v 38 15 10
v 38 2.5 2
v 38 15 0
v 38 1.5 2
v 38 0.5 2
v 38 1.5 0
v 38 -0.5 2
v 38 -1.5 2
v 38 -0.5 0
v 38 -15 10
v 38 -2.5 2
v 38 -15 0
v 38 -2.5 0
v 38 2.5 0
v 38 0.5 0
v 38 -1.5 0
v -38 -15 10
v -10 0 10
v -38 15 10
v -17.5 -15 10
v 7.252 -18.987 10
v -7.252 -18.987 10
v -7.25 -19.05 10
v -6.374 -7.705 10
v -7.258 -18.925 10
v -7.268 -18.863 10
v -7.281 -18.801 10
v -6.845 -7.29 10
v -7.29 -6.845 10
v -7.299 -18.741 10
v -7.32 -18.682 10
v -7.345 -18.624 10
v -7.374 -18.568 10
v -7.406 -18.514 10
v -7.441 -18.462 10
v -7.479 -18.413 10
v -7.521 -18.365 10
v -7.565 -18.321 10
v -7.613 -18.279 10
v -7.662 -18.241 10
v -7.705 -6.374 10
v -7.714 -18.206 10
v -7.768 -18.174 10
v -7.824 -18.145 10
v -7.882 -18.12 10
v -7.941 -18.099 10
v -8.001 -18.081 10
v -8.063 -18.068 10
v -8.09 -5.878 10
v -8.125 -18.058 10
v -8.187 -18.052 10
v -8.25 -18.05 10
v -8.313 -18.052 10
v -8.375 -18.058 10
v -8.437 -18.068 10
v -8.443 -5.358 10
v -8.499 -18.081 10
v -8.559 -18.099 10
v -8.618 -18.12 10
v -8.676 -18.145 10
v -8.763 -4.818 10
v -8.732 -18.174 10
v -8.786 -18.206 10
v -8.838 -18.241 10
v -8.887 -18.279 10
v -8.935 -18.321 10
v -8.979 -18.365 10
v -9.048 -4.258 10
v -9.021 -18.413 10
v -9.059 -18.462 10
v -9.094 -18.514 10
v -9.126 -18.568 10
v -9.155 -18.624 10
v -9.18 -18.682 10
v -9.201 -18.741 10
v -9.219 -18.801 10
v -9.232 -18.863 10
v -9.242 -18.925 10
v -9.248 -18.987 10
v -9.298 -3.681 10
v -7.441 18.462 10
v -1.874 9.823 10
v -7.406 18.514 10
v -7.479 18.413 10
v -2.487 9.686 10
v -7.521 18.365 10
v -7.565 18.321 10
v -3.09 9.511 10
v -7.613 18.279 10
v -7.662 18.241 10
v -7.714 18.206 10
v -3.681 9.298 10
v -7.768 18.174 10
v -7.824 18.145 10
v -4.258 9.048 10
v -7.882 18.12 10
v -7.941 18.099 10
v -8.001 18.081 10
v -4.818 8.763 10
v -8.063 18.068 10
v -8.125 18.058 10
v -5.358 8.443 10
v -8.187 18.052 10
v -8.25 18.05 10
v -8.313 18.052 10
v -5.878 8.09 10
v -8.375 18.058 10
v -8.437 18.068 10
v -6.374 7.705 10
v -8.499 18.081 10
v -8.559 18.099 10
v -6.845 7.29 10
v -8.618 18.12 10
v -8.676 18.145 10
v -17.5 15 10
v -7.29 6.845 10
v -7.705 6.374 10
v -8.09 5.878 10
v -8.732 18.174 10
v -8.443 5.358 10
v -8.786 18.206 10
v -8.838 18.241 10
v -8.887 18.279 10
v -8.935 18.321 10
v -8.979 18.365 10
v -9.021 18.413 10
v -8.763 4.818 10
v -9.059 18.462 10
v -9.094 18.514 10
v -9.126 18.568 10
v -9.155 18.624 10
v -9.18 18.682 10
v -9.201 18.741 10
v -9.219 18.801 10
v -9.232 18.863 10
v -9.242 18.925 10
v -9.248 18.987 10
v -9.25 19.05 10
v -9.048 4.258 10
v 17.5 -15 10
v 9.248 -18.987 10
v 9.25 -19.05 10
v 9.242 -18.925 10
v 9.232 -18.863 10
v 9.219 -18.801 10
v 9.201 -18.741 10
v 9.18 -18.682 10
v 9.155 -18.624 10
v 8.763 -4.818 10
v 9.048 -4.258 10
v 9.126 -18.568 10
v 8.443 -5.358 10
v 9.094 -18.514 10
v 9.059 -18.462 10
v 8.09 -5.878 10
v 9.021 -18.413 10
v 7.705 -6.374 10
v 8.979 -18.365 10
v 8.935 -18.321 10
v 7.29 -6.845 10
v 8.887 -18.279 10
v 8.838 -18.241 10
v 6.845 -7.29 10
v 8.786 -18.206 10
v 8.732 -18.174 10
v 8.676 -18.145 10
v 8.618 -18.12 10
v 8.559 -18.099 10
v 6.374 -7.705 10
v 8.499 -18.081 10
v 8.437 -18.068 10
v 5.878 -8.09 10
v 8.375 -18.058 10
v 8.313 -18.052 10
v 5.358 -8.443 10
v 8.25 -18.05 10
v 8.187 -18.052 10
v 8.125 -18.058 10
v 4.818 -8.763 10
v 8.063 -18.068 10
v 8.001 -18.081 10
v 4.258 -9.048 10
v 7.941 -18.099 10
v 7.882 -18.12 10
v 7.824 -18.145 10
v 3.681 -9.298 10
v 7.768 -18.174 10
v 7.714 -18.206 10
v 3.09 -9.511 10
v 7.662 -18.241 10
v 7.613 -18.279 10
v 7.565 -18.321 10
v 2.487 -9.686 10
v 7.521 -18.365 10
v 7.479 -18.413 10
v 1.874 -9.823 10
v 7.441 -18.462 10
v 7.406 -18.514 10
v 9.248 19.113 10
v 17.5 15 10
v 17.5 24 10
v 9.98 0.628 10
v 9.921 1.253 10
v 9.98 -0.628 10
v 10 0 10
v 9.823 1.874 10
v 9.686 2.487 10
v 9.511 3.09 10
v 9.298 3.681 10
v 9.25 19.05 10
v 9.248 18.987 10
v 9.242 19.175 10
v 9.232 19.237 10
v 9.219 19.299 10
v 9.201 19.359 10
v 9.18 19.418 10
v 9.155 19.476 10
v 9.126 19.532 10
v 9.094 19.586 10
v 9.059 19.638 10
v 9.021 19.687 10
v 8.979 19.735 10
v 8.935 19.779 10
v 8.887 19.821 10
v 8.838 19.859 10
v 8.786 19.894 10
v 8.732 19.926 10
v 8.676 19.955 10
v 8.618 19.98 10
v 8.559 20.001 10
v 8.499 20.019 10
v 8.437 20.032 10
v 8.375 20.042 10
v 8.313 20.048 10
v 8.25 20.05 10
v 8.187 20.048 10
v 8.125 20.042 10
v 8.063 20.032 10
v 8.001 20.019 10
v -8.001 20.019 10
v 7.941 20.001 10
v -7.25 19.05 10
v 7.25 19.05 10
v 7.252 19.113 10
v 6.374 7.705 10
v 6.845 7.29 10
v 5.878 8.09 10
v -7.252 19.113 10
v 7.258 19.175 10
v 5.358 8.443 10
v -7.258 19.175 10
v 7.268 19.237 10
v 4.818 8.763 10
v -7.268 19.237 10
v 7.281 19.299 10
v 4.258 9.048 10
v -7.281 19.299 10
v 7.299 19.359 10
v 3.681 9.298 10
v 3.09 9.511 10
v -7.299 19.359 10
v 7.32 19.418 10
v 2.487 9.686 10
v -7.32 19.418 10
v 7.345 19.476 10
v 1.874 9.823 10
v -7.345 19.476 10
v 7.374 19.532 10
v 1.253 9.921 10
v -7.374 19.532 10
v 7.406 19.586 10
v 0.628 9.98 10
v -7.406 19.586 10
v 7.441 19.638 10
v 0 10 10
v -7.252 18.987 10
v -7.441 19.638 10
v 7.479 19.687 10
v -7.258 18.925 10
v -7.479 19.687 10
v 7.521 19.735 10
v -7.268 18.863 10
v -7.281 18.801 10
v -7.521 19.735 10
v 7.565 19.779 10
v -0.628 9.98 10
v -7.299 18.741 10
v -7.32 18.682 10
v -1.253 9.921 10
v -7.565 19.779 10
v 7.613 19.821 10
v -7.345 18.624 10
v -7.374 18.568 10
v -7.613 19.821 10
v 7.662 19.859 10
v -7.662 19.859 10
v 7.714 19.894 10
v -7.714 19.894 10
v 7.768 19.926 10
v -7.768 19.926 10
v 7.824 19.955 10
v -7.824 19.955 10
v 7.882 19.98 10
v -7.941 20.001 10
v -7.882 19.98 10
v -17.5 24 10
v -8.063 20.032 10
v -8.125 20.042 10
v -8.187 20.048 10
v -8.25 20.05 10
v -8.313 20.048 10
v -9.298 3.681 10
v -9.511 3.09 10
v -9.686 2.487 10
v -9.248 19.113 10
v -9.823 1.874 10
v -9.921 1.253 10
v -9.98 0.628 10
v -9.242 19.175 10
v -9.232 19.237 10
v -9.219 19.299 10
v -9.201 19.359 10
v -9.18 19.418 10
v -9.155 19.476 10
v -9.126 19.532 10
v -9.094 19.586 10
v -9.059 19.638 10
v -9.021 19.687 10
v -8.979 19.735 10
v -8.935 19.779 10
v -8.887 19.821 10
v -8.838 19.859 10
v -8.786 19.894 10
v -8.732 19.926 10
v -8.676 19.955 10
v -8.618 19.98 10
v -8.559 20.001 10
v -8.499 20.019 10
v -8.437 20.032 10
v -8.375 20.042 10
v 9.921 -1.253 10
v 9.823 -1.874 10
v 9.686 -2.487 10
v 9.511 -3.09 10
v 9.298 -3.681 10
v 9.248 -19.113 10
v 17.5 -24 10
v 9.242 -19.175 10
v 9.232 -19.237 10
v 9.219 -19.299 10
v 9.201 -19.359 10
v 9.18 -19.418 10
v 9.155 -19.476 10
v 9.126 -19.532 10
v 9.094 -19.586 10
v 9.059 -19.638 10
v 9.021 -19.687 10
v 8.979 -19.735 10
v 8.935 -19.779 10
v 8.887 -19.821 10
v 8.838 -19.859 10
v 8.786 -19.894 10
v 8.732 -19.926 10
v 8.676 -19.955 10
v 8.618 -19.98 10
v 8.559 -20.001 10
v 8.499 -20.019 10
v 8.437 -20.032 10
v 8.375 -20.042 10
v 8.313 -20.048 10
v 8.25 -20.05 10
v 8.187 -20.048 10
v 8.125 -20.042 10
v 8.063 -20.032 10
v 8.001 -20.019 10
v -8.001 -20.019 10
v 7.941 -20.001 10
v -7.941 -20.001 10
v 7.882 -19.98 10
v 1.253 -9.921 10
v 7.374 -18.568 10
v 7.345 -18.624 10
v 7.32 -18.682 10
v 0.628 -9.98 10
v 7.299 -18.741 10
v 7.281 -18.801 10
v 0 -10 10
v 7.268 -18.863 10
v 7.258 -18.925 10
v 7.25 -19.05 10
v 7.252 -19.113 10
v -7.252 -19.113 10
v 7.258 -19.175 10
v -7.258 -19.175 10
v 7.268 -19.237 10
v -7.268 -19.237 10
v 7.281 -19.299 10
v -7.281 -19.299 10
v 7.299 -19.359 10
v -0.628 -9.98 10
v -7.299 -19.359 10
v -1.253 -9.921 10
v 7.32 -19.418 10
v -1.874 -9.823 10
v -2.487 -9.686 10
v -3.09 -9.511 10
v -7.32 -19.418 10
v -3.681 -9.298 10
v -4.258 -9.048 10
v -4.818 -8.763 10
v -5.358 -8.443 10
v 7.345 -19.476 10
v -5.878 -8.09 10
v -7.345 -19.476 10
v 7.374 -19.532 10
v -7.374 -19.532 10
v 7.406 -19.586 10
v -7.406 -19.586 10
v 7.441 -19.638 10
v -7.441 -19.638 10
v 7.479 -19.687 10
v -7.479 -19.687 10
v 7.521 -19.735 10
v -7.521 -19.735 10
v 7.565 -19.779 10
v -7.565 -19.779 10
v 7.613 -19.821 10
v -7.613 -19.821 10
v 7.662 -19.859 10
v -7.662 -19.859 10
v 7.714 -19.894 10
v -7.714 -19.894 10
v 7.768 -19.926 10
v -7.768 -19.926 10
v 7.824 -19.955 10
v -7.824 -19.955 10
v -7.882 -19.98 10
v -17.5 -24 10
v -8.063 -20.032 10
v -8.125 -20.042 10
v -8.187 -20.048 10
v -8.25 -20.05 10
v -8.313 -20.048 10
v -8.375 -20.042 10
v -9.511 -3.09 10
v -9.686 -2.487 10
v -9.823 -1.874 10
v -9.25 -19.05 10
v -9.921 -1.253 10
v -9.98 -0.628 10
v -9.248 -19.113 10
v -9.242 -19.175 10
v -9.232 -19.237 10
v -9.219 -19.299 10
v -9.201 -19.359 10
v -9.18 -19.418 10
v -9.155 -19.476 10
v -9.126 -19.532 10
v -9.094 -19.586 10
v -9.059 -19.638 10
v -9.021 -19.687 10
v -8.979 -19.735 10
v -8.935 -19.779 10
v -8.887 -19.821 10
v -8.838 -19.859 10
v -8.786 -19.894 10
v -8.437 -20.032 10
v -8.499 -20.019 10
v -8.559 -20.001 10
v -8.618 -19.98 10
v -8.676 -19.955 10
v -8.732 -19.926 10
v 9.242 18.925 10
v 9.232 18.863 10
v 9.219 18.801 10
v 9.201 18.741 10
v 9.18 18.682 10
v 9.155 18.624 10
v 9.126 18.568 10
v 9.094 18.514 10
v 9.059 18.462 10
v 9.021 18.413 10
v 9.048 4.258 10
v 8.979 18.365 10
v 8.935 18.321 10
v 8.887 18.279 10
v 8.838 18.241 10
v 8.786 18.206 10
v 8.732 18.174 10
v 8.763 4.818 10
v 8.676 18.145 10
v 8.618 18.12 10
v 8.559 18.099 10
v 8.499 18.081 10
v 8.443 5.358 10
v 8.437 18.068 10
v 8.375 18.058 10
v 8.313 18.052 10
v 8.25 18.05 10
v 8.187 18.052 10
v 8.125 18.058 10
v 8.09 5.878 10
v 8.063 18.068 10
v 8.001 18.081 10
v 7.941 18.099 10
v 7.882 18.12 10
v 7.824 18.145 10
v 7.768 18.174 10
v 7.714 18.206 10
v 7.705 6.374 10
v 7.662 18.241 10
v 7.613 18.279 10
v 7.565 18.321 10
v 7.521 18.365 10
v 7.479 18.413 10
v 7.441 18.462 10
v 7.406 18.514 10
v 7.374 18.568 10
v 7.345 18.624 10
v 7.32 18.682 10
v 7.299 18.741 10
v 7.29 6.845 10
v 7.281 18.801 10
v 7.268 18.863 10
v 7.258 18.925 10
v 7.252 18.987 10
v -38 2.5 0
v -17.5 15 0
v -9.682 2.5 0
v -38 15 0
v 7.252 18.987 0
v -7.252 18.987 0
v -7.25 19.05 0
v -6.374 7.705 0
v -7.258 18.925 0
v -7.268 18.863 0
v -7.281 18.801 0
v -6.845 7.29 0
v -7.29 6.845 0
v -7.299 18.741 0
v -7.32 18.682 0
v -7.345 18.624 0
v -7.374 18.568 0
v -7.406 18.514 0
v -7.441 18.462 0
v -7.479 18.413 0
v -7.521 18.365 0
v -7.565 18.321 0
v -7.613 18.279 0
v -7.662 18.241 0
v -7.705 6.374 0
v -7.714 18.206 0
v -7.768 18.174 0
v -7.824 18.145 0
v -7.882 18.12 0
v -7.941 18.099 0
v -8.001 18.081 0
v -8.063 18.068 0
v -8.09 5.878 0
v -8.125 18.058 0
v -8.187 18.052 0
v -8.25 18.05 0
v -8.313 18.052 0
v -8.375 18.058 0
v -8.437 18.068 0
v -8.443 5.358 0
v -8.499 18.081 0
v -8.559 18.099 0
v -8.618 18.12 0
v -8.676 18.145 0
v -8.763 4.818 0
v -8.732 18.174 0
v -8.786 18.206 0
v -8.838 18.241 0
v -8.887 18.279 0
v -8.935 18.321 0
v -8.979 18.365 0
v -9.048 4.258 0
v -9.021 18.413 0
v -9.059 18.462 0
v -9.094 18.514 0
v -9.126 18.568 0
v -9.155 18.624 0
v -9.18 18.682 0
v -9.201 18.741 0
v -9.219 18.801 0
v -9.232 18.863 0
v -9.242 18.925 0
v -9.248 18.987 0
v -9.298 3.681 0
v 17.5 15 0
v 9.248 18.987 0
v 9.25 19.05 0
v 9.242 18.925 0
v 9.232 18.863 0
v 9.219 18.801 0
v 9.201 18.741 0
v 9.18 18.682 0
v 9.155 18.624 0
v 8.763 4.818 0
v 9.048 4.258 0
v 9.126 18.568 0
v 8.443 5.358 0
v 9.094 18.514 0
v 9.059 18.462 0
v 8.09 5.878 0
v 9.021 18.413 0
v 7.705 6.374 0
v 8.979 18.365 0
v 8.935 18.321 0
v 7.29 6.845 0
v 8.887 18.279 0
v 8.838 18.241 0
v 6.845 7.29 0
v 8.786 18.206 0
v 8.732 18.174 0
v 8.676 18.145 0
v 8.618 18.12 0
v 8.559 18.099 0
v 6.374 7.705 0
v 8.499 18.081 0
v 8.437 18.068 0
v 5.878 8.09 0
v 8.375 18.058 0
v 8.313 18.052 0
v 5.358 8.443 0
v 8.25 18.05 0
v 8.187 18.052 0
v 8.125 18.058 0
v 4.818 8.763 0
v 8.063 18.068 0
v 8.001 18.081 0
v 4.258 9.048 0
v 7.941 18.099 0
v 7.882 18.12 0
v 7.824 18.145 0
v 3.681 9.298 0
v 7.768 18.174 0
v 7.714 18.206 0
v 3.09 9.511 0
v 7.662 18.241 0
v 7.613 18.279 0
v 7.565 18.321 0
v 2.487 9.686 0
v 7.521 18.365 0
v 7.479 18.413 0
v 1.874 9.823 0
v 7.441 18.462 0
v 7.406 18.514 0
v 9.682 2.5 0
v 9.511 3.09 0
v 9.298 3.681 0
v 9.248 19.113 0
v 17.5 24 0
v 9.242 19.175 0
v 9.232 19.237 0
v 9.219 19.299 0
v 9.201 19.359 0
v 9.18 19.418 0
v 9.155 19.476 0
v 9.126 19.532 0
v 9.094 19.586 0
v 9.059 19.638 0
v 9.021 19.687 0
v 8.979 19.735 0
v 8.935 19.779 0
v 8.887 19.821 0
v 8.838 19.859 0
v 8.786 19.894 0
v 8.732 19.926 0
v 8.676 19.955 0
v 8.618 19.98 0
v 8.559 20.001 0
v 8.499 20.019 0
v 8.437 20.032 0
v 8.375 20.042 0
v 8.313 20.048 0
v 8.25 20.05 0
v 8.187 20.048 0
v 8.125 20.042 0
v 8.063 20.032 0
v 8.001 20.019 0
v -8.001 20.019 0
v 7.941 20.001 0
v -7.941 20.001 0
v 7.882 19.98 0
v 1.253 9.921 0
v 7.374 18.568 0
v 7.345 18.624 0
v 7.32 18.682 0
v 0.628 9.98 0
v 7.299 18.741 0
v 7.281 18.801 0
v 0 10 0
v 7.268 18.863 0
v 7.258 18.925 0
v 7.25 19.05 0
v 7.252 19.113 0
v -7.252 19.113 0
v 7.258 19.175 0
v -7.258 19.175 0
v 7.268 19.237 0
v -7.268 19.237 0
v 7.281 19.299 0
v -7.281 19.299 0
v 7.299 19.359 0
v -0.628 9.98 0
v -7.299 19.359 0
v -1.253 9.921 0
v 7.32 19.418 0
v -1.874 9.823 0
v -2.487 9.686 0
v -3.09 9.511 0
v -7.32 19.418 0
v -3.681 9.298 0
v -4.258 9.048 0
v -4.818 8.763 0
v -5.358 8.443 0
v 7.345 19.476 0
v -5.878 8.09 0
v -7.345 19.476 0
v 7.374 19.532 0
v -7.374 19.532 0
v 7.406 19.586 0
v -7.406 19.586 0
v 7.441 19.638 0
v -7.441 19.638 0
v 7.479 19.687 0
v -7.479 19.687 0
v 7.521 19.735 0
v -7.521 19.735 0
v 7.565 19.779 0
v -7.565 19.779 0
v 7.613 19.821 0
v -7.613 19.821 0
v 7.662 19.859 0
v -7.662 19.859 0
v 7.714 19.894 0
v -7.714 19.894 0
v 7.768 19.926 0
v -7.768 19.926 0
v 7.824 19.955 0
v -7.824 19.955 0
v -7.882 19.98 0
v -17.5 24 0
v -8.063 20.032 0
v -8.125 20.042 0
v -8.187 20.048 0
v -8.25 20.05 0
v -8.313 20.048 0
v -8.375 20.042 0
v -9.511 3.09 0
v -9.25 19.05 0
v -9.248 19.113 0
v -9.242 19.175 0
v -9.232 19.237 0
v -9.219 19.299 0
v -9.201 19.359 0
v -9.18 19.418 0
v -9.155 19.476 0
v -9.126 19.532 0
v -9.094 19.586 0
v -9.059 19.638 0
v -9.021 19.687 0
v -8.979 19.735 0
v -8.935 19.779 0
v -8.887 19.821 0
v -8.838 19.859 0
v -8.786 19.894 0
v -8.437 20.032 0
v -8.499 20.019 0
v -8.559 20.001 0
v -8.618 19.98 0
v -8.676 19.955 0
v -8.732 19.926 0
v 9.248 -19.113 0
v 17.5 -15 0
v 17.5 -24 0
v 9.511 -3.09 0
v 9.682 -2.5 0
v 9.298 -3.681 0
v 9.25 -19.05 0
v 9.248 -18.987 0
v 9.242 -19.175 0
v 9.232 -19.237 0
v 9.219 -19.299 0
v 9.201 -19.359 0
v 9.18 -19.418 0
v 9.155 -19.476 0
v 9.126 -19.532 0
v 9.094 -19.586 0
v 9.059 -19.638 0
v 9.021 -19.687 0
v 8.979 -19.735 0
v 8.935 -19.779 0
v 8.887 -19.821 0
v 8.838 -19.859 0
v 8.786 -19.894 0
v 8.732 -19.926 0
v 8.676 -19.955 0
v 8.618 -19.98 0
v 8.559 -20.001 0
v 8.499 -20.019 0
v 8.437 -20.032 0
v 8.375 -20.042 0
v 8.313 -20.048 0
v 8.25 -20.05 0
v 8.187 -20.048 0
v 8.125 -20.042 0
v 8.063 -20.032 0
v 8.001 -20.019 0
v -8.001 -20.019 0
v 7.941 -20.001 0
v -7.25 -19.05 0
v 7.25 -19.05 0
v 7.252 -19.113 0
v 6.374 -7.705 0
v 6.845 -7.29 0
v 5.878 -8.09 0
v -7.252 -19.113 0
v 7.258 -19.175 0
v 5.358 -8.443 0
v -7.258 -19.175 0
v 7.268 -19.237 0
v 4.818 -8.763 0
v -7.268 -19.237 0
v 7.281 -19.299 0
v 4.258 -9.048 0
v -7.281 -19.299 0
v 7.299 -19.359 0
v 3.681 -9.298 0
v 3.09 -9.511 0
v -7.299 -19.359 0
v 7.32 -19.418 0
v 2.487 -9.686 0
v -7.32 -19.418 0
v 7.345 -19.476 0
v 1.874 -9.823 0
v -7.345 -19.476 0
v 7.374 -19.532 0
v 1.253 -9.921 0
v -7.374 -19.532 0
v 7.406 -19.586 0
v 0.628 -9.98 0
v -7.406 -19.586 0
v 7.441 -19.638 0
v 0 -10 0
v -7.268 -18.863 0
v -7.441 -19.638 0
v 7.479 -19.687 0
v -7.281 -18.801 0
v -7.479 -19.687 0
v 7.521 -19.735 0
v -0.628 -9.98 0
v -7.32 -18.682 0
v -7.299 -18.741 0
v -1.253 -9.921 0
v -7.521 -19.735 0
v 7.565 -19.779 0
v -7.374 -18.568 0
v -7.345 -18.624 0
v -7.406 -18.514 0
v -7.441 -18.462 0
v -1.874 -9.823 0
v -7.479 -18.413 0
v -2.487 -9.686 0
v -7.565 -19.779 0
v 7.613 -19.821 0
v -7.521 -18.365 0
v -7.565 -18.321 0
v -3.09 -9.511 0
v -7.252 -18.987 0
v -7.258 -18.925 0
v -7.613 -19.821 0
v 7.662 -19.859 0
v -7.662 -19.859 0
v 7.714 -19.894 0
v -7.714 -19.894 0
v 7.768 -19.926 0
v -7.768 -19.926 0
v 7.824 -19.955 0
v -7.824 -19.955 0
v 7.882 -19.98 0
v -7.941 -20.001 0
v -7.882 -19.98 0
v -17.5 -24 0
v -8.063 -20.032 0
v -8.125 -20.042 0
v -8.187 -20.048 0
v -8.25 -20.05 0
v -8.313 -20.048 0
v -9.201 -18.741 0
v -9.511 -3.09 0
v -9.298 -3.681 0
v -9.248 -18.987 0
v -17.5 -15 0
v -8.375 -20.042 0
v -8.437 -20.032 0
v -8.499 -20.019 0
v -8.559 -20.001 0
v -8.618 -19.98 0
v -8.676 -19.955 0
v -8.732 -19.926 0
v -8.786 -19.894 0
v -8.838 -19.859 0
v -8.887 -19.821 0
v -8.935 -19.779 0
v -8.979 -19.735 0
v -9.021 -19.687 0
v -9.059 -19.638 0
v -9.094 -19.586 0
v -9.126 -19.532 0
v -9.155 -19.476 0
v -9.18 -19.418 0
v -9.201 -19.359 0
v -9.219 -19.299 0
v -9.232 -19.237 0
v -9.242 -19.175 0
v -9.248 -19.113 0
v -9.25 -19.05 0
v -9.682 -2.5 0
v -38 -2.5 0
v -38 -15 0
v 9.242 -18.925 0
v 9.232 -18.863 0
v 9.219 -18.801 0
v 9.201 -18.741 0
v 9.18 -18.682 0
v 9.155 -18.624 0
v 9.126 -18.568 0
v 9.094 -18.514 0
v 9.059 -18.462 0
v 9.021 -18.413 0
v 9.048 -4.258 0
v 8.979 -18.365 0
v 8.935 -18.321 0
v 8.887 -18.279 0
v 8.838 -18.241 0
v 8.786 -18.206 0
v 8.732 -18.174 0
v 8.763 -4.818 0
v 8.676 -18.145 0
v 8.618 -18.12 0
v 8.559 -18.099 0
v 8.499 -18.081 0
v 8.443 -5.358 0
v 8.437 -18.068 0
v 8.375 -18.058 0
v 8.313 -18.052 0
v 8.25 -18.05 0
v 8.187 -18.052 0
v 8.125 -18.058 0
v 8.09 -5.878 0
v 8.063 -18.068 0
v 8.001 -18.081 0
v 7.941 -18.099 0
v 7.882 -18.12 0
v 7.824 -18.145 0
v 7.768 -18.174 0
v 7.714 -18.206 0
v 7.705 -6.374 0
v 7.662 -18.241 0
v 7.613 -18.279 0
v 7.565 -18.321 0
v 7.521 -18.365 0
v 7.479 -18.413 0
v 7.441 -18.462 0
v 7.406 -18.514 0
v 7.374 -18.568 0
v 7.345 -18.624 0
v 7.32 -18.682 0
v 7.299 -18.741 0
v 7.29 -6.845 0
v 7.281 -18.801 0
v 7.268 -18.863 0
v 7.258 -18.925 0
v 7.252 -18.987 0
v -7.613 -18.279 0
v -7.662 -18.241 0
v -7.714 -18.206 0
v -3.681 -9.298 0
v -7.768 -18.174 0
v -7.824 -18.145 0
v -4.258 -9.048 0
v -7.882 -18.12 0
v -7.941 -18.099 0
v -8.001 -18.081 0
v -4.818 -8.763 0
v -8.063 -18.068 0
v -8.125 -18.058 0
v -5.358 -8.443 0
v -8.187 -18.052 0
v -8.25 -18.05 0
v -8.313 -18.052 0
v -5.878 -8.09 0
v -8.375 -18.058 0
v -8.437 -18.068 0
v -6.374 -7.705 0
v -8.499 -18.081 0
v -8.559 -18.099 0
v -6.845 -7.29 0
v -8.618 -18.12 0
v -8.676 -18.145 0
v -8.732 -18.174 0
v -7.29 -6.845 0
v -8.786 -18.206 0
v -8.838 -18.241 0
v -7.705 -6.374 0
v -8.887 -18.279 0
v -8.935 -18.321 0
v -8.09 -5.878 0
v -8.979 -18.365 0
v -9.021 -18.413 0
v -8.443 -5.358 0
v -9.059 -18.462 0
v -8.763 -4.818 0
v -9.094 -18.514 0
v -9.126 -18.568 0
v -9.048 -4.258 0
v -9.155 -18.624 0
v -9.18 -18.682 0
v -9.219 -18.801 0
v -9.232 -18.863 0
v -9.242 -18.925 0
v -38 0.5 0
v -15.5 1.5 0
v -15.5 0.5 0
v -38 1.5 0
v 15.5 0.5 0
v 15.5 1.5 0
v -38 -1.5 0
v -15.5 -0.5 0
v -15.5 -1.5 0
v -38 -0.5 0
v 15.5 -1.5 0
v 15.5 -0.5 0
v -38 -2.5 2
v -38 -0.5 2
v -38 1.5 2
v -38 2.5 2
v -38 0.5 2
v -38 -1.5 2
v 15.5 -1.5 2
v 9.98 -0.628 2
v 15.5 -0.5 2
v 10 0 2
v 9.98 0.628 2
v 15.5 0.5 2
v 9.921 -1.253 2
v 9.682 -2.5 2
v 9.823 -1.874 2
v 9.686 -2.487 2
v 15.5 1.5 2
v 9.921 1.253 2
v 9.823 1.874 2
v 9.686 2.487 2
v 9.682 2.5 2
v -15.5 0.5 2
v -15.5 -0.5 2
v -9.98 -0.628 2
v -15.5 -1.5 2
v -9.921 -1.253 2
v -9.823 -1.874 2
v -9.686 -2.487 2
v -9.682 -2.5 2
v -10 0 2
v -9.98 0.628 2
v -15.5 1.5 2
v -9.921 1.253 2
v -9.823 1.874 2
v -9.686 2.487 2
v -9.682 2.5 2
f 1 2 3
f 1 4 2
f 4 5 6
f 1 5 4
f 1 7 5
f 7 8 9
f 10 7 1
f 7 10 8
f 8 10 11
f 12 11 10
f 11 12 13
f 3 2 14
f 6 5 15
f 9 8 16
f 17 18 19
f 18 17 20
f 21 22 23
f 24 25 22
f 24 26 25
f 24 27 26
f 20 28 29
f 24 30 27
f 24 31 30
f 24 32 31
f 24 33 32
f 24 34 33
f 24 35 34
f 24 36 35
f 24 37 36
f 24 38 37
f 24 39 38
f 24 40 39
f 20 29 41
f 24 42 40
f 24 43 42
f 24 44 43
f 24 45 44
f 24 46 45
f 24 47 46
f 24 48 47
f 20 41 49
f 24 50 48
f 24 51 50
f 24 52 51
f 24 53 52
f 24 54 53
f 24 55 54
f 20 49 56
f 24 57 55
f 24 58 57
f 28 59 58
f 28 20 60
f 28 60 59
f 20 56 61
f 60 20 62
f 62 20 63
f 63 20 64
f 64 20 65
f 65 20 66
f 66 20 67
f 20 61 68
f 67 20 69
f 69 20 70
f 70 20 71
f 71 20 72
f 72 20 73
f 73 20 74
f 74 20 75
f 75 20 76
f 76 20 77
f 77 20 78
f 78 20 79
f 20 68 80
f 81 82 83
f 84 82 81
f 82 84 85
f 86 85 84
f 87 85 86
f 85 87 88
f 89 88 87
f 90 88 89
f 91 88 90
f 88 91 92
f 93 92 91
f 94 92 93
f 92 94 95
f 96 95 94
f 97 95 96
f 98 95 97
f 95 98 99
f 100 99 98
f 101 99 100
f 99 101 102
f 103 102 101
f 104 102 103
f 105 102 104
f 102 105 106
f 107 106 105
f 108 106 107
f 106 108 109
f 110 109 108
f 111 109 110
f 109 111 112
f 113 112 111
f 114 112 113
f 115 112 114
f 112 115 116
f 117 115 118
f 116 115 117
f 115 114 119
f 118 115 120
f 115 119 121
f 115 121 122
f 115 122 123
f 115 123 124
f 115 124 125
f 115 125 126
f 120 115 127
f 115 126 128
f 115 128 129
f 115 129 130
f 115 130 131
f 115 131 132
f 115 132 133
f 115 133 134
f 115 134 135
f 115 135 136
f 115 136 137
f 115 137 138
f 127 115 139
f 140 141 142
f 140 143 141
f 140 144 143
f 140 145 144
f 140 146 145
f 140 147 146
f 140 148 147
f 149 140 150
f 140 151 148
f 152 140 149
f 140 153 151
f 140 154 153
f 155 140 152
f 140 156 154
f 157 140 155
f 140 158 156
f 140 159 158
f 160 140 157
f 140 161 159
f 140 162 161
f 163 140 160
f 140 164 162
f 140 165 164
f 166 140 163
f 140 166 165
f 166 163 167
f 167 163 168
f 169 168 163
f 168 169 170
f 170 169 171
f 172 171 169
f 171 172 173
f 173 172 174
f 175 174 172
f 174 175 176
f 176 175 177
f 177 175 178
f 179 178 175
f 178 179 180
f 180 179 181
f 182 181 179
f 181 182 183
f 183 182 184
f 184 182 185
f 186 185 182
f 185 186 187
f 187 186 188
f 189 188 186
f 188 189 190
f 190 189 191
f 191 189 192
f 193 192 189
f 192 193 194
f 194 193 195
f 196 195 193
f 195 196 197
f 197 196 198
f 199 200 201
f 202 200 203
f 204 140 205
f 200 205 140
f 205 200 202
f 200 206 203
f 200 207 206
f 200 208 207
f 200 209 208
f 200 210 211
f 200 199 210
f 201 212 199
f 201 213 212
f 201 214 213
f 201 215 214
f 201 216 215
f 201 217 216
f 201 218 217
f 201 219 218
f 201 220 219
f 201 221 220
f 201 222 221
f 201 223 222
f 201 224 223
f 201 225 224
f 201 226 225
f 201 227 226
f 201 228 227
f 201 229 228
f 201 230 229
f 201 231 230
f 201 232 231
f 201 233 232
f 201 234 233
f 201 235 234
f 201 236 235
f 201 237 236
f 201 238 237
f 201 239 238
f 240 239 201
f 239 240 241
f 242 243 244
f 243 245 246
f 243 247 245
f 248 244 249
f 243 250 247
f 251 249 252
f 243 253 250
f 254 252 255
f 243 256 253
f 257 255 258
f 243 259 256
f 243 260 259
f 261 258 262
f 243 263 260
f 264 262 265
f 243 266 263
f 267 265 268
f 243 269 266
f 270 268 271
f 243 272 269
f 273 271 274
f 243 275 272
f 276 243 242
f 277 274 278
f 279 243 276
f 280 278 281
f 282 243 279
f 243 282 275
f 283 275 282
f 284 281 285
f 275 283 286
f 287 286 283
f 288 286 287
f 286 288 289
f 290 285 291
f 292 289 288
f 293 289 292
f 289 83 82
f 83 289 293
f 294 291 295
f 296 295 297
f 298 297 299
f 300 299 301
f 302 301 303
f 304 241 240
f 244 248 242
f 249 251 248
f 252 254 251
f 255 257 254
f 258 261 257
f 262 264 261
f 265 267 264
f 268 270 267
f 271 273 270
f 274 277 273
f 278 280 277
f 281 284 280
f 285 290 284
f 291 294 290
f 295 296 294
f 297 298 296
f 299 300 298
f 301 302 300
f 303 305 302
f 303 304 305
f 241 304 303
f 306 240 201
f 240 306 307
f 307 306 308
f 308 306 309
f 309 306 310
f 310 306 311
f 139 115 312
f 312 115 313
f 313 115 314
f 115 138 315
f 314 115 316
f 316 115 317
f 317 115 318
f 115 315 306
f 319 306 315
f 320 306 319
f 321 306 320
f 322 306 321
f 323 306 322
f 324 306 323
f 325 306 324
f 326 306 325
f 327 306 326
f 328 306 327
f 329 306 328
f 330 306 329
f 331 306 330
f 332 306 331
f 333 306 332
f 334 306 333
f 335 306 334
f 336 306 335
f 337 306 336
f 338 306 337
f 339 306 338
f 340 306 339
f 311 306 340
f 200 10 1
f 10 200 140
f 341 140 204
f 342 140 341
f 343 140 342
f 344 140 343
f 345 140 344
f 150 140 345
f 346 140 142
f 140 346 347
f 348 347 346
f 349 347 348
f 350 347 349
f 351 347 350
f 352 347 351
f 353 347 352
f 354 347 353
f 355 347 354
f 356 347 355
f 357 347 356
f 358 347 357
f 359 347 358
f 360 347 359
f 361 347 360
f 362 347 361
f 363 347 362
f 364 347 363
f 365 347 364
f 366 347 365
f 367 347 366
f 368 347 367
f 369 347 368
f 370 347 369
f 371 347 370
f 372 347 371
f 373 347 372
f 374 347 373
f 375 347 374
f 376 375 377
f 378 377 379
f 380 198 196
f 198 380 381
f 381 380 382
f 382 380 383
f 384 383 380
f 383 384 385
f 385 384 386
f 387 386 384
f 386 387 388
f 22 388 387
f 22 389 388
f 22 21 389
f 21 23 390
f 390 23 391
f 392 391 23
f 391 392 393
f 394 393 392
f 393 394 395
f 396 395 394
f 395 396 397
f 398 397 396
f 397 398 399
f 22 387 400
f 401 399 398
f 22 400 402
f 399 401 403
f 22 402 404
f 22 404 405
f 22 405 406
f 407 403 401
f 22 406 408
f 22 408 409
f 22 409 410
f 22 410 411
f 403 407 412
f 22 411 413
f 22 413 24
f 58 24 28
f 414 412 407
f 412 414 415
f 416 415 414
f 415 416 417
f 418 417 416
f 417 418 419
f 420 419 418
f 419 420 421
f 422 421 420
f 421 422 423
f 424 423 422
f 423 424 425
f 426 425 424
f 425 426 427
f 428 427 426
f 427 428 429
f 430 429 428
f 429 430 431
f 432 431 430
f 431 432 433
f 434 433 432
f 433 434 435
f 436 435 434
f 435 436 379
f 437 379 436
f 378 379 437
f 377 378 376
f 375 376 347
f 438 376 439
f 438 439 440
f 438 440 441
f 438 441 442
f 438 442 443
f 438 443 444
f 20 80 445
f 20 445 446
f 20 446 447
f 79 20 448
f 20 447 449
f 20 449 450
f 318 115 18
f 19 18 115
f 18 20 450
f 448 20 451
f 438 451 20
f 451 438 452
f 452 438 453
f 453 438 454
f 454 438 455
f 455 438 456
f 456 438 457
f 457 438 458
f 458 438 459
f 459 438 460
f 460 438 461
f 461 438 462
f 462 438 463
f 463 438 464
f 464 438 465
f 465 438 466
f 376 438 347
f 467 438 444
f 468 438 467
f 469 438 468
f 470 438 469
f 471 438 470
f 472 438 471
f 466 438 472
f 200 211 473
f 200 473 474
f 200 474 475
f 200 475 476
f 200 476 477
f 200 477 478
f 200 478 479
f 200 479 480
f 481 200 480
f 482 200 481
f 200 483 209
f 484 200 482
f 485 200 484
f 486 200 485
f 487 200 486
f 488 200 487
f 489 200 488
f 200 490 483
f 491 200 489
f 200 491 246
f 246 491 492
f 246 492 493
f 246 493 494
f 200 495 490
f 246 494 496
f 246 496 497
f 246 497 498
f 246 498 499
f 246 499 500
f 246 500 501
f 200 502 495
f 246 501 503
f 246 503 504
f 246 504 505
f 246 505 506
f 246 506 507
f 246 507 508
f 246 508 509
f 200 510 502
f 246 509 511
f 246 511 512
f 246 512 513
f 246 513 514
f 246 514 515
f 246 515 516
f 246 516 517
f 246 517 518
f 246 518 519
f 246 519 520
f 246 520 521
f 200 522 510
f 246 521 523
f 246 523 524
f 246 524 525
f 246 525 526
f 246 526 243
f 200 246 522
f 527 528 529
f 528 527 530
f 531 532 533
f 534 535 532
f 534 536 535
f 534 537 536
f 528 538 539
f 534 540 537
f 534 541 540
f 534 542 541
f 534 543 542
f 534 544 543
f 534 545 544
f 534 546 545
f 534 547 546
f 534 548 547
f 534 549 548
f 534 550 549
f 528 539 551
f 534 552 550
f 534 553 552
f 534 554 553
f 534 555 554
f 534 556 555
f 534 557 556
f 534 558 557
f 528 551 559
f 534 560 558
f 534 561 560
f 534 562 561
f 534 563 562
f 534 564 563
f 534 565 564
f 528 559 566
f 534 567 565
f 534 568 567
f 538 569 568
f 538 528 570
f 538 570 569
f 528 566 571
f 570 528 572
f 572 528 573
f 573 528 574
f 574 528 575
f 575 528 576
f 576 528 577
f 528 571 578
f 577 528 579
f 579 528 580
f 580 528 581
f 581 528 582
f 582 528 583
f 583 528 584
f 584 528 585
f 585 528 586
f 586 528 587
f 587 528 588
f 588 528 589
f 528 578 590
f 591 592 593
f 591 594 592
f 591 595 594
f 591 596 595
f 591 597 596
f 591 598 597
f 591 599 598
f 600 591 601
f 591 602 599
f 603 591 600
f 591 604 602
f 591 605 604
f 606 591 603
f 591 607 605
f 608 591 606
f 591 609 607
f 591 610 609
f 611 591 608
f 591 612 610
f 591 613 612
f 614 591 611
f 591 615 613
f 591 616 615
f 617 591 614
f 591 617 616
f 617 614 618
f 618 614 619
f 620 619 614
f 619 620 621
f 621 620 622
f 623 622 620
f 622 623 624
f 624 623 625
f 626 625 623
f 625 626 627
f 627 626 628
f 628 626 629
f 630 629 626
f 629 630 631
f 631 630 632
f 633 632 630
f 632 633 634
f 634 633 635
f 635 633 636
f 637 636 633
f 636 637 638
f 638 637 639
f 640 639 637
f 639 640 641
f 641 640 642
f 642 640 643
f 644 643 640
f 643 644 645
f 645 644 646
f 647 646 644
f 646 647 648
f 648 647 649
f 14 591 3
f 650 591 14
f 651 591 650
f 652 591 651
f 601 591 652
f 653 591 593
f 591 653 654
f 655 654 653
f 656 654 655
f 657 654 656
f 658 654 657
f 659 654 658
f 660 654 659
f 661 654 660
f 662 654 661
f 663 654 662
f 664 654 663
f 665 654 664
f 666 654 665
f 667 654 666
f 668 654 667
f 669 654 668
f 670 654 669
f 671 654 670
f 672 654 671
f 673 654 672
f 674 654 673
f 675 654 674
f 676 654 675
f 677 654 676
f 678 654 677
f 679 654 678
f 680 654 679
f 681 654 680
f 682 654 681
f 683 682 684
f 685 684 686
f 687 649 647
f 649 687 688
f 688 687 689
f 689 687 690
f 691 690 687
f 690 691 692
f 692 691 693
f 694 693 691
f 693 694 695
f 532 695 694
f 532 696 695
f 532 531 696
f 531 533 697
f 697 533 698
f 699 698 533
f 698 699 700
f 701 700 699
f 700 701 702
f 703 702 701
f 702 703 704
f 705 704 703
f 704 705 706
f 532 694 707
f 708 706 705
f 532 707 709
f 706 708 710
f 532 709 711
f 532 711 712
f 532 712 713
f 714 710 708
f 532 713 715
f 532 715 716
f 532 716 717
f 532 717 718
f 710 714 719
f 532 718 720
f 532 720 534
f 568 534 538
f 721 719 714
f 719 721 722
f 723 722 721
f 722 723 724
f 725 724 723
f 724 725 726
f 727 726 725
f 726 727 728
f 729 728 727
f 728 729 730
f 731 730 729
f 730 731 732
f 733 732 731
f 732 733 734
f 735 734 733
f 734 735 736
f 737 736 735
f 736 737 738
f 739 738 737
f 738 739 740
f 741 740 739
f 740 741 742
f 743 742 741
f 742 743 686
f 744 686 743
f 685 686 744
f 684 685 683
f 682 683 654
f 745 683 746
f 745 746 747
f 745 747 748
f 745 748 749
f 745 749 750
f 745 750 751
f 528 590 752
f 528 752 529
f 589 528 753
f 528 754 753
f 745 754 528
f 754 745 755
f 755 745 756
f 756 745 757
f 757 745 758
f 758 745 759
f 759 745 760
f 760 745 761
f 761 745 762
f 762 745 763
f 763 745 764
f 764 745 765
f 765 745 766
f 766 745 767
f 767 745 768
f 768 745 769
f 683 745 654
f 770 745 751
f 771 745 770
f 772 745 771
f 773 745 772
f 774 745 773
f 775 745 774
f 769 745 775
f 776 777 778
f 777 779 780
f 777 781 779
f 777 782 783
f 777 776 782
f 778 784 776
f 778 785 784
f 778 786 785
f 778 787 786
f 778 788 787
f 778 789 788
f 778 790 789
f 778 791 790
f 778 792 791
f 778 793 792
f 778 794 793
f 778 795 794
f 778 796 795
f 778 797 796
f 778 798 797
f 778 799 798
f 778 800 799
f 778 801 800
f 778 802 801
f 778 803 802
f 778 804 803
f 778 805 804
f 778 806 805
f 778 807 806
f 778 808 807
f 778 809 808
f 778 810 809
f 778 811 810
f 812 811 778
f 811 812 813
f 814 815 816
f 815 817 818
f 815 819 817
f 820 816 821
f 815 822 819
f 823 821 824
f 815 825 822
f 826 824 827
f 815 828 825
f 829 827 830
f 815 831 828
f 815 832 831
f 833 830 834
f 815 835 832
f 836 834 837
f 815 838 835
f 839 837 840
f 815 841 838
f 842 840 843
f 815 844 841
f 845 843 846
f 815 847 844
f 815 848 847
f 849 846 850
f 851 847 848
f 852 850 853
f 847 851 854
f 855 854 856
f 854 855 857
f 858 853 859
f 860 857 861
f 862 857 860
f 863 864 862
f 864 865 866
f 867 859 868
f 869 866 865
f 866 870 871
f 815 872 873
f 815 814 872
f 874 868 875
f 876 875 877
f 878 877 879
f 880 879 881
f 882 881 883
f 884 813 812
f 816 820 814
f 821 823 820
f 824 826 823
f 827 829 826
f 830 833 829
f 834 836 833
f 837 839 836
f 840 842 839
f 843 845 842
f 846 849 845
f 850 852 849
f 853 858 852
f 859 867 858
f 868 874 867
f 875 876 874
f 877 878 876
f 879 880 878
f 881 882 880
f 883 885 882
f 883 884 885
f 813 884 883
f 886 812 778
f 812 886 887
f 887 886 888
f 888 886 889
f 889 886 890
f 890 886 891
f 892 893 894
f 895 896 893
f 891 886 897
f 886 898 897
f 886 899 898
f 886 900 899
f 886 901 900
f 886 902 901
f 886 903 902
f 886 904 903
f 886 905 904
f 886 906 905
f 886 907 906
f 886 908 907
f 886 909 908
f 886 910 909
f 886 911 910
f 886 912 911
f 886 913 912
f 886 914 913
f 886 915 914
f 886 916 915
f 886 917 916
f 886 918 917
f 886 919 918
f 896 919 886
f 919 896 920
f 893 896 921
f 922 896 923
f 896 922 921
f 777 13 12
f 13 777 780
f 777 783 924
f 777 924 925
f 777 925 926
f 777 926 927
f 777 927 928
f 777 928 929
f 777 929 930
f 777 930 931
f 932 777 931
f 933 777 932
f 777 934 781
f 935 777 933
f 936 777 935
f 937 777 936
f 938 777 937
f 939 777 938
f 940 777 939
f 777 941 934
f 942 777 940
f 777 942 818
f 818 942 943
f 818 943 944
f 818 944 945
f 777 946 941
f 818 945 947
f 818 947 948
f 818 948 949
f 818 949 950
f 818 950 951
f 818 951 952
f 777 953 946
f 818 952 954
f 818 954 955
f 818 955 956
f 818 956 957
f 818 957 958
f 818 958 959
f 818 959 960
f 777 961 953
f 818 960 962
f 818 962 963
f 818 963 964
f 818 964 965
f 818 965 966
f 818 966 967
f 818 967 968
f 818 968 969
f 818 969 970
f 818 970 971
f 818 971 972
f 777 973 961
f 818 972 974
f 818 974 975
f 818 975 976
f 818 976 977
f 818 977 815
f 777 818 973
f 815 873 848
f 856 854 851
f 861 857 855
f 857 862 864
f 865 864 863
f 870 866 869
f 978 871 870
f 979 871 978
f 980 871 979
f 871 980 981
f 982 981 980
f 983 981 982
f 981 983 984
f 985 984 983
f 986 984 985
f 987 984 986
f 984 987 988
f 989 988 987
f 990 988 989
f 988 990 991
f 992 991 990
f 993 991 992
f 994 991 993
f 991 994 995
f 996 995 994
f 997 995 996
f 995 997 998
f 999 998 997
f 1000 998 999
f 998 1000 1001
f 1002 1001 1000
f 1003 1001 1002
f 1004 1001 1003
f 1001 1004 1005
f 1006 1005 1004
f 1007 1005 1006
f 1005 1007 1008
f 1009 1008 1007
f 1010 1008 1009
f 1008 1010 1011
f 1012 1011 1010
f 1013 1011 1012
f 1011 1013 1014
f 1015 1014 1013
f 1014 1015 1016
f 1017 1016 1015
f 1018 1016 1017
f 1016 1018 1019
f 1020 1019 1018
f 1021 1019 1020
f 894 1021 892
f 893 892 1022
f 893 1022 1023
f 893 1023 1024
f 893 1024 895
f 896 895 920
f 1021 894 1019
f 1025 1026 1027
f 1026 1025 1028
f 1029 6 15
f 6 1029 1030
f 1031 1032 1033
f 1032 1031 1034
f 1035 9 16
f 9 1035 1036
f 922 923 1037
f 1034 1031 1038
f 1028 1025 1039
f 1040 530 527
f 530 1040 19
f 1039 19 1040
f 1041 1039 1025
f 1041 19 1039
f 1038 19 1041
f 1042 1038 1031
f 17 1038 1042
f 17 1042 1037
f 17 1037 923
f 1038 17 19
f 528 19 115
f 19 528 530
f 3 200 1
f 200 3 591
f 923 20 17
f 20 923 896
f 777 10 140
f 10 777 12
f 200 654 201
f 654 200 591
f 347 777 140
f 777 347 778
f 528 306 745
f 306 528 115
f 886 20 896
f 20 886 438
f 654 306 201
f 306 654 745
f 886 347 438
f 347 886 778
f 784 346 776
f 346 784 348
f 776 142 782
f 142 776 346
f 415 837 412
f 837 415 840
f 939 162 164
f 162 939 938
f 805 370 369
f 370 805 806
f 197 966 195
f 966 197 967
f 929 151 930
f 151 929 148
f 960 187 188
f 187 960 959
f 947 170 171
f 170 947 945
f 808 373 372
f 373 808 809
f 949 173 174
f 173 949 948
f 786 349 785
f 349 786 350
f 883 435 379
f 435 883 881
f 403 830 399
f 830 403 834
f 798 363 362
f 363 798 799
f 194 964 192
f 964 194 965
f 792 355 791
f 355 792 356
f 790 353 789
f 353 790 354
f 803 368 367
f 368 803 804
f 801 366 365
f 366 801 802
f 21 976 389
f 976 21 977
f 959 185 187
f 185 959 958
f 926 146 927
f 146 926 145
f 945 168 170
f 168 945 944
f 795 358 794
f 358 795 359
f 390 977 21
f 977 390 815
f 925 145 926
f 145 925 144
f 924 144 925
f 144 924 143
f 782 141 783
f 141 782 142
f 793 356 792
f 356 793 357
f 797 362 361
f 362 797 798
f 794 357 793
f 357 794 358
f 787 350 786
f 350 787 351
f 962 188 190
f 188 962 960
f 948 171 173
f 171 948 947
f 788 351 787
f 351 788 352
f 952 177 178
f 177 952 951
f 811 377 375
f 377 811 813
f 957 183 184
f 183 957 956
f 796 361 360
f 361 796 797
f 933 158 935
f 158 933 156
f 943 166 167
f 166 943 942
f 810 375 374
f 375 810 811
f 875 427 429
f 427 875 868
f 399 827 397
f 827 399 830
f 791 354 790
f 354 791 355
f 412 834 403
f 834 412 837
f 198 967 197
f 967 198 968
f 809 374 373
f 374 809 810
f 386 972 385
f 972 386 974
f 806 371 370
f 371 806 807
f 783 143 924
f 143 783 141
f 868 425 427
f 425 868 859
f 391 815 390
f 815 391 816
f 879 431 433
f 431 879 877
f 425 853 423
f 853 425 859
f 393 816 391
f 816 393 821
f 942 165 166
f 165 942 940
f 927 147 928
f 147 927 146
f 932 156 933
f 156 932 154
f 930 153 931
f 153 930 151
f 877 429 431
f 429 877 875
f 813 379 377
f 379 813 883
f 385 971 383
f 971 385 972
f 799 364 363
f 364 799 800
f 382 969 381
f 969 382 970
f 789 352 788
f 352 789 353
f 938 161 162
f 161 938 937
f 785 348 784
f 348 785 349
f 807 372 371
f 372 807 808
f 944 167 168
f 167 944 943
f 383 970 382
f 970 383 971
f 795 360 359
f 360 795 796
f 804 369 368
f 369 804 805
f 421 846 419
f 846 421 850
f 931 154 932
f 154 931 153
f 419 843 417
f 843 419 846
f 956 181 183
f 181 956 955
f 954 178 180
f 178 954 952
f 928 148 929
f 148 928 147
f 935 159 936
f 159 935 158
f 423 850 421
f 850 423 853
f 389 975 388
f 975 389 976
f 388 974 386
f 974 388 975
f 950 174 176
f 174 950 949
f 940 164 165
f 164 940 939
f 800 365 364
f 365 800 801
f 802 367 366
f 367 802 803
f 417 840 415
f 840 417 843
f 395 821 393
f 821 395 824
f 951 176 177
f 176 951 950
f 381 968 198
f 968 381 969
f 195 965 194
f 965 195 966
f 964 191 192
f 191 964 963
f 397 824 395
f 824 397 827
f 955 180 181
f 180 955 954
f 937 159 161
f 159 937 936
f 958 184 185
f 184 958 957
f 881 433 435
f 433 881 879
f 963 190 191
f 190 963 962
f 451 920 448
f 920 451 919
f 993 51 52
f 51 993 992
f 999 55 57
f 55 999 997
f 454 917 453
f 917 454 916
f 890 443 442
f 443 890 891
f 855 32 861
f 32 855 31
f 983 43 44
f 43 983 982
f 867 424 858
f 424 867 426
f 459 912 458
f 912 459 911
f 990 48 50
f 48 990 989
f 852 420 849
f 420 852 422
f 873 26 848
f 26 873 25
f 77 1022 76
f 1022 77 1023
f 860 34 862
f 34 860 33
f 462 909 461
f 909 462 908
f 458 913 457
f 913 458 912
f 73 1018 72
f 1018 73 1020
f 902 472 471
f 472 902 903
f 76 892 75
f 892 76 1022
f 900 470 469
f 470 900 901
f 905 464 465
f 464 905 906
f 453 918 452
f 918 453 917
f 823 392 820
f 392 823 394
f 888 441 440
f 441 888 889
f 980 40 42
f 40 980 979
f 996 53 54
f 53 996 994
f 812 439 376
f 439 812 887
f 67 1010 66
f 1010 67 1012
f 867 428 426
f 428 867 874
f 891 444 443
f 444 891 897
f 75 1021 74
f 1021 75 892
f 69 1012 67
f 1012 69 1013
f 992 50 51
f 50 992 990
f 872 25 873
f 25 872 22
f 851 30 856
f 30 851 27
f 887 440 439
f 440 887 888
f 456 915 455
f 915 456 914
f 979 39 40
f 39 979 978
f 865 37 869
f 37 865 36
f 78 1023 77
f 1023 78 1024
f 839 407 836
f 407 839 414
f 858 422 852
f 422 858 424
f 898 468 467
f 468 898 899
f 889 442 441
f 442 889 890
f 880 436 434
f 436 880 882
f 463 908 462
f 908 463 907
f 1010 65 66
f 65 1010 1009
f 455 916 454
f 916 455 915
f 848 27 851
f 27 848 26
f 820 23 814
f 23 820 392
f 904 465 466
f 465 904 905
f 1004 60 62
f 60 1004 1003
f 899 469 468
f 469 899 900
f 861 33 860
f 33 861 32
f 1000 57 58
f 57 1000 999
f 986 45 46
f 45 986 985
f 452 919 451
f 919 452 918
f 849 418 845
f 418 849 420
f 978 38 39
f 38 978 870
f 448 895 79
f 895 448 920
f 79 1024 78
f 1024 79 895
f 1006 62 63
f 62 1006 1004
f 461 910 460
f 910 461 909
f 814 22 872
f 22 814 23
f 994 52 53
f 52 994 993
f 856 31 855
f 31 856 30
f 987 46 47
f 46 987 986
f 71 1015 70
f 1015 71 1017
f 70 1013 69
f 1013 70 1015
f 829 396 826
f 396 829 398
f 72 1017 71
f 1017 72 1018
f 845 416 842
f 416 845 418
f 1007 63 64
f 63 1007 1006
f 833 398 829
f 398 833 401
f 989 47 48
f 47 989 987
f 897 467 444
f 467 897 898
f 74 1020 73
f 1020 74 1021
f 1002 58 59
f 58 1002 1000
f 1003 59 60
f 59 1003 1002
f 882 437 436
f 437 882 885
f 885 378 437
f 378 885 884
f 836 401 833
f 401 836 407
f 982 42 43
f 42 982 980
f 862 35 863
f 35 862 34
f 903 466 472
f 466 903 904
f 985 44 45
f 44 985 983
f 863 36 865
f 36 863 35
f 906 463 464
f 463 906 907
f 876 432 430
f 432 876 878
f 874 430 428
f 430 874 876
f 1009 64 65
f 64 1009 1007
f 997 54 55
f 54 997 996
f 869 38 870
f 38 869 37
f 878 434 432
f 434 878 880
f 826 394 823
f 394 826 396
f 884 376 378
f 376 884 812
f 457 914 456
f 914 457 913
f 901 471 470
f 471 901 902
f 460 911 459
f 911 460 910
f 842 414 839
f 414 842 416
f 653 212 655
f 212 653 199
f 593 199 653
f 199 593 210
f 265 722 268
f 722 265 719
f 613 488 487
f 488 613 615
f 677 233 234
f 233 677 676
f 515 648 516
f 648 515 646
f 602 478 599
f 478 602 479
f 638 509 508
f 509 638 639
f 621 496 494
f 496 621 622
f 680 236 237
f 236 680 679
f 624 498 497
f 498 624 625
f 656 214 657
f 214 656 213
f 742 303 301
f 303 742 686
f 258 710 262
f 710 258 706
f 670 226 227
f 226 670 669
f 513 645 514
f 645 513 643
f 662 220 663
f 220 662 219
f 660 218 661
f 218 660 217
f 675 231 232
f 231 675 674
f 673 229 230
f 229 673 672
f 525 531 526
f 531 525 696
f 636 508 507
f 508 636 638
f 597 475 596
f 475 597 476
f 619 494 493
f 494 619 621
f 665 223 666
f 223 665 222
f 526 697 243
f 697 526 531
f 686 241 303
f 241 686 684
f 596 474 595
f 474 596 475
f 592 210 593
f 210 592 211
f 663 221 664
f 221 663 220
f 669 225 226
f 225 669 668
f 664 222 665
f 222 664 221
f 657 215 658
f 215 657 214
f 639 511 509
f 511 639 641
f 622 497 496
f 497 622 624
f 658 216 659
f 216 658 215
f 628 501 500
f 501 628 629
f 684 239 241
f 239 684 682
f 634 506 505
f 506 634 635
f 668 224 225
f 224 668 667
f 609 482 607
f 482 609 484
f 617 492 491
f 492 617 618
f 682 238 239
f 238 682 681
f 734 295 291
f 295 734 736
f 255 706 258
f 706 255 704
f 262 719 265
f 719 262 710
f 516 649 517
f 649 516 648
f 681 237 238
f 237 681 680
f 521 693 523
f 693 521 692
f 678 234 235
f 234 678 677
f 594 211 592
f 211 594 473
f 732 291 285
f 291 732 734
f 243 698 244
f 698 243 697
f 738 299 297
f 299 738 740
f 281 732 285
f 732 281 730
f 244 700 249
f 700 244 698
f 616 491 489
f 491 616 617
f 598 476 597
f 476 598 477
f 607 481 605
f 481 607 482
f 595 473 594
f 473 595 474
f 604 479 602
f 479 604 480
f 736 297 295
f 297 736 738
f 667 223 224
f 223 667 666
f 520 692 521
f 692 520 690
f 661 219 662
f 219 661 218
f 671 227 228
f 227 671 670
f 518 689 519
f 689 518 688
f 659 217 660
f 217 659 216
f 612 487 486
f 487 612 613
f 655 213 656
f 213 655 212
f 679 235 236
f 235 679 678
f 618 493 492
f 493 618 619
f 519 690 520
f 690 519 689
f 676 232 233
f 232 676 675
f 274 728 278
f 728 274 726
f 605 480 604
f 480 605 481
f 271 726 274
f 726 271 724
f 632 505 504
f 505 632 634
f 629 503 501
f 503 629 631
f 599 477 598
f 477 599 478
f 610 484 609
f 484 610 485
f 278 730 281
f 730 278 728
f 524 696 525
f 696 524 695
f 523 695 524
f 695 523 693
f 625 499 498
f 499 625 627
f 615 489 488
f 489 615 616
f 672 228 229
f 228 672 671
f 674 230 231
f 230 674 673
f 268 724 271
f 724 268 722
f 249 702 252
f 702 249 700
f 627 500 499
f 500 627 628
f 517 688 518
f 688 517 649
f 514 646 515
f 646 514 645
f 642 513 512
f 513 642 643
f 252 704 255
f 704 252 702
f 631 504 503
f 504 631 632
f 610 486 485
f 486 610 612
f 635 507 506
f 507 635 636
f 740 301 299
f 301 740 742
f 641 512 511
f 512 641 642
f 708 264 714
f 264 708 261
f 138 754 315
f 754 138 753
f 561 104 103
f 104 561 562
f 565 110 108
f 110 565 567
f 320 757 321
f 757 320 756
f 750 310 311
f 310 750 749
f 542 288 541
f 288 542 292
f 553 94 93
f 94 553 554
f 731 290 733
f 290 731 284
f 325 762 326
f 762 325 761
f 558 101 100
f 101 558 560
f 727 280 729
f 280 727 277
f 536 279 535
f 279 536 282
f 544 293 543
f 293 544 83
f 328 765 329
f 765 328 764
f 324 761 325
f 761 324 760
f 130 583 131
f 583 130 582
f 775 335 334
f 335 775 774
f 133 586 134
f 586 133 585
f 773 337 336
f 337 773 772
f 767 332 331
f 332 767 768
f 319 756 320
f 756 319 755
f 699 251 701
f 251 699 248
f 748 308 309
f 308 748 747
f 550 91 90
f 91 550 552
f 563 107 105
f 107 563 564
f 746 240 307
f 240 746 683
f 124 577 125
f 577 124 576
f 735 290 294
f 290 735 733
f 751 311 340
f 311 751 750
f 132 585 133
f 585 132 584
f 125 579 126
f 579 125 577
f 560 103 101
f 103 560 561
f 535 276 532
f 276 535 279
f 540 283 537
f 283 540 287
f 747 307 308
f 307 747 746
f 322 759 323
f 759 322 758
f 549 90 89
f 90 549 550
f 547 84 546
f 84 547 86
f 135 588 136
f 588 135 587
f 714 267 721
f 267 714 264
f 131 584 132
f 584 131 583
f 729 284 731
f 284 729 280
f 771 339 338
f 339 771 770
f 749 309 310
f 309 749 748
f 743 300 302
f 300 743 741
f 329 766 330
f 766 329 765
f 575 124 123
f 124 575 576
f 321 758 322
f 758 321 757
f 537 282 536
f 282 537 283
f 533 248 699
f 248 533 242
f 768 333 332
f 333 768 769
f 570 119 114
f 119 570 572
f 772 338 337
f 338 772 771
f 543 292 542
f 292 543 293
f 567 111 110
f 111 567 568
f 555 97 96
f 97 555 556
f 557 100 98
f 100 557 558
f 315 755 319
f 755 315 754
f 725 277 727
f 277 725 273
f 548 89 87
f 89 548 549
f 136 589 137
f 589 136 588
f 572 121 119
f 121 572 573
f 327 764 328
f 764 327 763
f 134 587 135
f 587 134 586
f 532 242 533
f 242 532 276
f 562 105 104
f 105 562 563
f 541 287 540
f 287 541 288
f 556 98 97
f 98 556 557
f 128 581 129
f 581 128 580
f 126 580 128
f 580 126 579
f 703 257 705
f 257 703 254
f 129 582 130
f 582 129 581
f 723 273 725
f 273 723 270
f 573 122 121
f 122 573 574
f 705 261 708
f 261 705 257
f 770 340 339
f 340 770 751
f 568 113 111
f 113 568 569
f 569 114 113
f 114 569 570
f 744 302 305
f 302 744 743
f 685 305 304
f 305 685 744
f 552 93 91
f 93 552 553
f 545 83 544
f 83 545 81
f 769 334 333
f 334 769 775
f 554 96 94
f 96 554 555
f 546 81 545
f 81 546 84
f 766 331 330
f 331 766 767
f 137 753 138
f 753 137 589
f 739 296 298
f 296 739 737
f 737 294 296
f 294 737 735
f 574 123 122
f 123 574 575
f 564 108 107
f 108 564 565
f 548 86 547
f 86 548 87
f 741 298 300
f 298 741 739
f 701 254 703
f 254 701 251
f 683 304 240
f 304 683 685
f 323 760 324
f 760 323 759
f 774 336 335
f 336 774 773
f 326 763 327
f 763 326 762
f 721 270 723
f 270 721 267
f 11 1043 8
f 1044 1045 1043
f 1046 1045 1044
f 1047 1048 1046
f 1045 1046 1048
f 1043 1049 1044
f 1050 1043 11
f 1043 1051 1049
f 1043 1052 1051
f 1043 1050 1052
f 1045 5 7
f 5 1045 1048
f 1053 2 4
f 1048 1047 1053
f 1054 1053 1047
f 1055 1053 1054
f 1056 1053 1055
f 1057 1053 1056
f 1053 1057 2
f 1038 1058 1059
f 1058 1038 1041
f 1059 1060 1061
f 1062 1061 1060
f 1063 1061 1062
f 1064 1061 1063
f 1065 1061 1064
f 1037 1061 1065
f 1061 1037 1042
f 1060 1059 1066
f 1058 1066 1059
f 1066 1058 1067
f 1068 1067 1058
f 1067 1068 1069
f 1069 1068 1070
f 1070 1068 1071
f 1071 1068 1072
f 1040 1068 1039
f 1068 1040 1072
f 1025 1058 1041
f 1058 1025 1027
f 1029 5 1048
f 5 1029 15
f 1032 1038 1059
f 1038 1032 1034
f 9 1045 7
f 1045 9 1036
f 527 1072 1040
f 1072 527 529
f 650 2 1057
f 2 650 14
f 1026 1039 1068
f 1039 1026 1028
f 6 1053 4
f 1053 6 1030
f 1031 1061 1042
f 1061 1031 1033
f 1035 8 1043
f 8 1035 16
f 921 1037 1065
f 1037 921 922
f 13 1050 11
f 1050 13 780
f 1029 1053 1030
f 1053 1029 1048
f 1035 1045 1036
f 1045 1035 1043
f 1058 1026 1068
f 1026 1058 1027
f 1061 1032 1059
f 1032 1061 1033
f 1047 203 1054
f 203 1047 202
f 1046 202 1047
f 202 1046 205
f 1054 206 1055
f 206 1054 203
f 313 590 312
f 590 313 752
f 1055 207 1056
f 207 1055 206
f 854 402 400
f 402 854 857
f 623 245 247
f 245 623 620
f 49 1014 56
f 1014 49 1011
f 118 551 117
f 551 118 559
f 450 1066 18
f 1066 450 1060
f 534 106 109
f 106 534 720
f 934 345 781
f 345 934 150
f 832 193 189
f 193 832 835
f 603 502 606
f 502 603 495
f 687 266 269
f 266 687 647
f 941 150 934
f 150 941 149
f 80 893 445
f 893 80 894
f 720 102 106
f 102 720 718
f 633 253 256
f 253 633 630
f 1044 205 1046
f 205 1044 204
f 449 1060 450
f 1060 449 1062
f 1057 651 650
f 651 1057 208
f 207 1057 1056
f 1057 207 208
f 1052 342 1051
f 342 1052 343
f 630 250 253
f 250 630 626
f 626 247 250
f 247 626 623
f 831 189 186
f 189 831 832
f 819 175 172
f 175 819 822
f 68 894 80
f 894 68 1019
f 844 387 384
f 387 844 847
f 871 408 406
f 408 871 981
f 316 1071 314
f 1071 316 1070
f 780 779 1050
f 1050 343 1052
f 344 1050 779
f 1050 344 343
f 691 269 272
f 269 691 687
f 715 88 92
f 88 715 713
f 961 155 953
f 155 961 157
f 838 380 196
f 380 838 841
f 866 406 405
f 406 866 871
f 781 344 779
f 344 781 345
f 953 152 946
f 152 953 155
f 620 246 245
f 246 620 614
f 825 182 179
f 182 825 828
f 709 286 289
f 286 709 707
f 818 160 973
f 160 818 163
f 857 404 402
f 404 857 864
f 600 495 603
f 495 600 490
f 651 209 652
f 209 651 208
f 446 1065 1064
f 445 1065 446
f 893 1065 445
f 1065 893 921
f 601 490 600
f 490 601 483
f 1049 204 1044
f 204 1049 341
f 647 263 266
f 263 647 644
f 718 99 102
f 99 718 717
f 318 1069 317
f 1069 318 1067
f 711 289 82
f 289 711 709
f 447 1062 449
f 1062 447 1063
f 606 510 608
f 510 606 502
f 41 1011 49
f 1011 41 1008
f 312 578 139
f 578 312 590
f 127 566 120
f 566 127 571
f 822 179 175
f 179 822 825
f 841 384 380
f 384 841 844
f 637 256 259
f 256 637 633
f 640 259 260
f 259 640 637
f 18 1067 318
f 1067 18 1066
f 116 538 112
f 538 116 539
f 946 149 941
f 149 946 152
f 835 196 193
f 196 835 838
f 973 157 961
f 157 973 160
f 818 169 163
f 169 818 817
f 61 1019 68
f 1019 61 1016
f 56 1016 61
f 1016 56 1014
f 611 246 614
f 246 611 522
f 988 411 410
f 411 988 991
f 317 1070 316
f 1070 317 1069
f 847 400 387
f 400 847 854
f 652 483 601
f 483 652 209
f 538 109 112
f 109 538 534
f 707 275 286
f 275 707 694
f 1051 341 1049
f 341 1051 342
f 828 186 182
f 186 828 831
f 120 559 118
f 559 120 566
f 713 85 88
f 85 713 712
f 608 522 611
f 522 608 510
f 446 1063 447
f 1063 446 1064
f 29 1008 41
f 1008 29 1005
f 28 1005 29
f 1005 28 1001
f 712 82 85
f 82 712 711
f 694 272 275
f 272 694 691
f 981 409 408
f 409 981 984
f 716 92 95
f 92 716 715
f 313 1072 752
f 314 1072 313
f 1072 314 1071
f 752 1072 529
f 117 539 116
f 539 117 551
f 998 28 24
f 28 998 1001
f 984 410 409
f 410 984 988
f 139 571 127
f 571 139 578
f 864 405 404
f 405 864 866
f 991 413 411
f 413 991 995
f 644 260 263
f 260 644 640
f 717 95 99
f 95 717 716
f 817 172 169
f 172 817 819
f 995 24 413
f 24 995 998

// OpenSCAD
//* Incubator module for Waterscope *//
//* M. Delmans *//

//put the extruded edge on the bottom
//put the hole for cable adaptor

//* Size of a glass slide *//
slideW = 26; //25x 76 in reality 
slideL = 76;
slideH = 1;

//* Size of a cover glass *//
coverW = 23; // 25x25 in reality
coverH = 0.8;
paperH = 0.2;
frameW = 4; // Gene frame width


//* Size of a temperature sensor Dallas 18B20 *//
sensorL = 8;
sensorW = 5;
sensorH = 4;

//* field of view hole
viewing_hole_R = 10;
viewing_hole_H = 100;

//* base for screwing
sample_base_Y = 48;
sample_base_X = 35;
screw_R = 1; // radius of screw
screw_H = 30; //height of screw holes


//---------end of bottom part

//* Size of a resistor heater RS 159-758 *//
heaterW=20;
heaterL = 11.4;
heaterWW = 6; // Size of an overhang
heaterH = 11;

// this is the edge thickness
holderFlankW = 2;
$fn = 100;

// ---------- for top part --

//For top half
top_half_H = 10;

//* Stage module (bottom part) *//

// screws

   

// bottom part
module Stage(){
    
   module screws(){  
        translate([8.25, 19.05, -0.5*screw_H]) cylinder(screw_H, screw_R, screw_R);

        mirror([1,0,0]) {    
            translate([8.25, 19.05, -0.5*screw_H]) cylinder(screw_H, screw_R, screw_R);}
       
        mirror([0,1,0]) {
            translate([8.25, 19.05, -0.5*screw_H]) cylinder(screw_H, screw_R, screw_R);

            mirror([1,0,0]) {    
                translate([8.25, 19.05, -0.5*screw_H]) cylinder(screw_H, screw_R, screw_R);}
        }
    }
   

   
    
   module sensors(){
        // 3_wires  (6 wires)
        translate([0, 0, -0.25*sensorH]) cube([slideL, 0.2*sensorW, 0.5*sensorH], center = true);
        translate([0, 0.4*sensorW, -0.25*sensorH]) cube([slideL, 0.2*sensorW, 0.5*sensorH], center = true);
        translate([0, -0.4*sensorW, -0.25*sensorH]) cube([slideL, 0.2*sensorW, 0.5*sensorH], center = true);
        // 2 sensor
        translate([0.5*( coverW - 2*frameW + sensorL ), 0, 0]) cube([sensorL, sensorW, sensorH], center = true);
        
       mirror([0,1,0])
        translate([-0.5*( coverW - 2*frameW + sensorL ), 0, 0]) cube([sensorL, sensorW, sensorH], center = true);
   }    

   
   //now the stage
   difference(){
        // bottom piece 
        // same size as glass slide + flank + 
        union() {
        // top half 
            translate([0,0,0.5*top_half_H])cube([slideL, slideW + 2*holderFlankW, top_half_H], center = true);
        //cross base for screwing
            translate([0,0,0.5*top_half_H])cube([sample_base_X, sample_base_Y, top_half_H], center = true);
        }
       
        screws();
        mirror([0,0,1])sensors();

           
        //viewing hole
        translate([0, 0, -0.5*sensorH])cylinder(viewing_hole_H, viewing_hole_R, viewing_hole_R);


    }
}

//translate([0, 0, -20]) 
Stage();
